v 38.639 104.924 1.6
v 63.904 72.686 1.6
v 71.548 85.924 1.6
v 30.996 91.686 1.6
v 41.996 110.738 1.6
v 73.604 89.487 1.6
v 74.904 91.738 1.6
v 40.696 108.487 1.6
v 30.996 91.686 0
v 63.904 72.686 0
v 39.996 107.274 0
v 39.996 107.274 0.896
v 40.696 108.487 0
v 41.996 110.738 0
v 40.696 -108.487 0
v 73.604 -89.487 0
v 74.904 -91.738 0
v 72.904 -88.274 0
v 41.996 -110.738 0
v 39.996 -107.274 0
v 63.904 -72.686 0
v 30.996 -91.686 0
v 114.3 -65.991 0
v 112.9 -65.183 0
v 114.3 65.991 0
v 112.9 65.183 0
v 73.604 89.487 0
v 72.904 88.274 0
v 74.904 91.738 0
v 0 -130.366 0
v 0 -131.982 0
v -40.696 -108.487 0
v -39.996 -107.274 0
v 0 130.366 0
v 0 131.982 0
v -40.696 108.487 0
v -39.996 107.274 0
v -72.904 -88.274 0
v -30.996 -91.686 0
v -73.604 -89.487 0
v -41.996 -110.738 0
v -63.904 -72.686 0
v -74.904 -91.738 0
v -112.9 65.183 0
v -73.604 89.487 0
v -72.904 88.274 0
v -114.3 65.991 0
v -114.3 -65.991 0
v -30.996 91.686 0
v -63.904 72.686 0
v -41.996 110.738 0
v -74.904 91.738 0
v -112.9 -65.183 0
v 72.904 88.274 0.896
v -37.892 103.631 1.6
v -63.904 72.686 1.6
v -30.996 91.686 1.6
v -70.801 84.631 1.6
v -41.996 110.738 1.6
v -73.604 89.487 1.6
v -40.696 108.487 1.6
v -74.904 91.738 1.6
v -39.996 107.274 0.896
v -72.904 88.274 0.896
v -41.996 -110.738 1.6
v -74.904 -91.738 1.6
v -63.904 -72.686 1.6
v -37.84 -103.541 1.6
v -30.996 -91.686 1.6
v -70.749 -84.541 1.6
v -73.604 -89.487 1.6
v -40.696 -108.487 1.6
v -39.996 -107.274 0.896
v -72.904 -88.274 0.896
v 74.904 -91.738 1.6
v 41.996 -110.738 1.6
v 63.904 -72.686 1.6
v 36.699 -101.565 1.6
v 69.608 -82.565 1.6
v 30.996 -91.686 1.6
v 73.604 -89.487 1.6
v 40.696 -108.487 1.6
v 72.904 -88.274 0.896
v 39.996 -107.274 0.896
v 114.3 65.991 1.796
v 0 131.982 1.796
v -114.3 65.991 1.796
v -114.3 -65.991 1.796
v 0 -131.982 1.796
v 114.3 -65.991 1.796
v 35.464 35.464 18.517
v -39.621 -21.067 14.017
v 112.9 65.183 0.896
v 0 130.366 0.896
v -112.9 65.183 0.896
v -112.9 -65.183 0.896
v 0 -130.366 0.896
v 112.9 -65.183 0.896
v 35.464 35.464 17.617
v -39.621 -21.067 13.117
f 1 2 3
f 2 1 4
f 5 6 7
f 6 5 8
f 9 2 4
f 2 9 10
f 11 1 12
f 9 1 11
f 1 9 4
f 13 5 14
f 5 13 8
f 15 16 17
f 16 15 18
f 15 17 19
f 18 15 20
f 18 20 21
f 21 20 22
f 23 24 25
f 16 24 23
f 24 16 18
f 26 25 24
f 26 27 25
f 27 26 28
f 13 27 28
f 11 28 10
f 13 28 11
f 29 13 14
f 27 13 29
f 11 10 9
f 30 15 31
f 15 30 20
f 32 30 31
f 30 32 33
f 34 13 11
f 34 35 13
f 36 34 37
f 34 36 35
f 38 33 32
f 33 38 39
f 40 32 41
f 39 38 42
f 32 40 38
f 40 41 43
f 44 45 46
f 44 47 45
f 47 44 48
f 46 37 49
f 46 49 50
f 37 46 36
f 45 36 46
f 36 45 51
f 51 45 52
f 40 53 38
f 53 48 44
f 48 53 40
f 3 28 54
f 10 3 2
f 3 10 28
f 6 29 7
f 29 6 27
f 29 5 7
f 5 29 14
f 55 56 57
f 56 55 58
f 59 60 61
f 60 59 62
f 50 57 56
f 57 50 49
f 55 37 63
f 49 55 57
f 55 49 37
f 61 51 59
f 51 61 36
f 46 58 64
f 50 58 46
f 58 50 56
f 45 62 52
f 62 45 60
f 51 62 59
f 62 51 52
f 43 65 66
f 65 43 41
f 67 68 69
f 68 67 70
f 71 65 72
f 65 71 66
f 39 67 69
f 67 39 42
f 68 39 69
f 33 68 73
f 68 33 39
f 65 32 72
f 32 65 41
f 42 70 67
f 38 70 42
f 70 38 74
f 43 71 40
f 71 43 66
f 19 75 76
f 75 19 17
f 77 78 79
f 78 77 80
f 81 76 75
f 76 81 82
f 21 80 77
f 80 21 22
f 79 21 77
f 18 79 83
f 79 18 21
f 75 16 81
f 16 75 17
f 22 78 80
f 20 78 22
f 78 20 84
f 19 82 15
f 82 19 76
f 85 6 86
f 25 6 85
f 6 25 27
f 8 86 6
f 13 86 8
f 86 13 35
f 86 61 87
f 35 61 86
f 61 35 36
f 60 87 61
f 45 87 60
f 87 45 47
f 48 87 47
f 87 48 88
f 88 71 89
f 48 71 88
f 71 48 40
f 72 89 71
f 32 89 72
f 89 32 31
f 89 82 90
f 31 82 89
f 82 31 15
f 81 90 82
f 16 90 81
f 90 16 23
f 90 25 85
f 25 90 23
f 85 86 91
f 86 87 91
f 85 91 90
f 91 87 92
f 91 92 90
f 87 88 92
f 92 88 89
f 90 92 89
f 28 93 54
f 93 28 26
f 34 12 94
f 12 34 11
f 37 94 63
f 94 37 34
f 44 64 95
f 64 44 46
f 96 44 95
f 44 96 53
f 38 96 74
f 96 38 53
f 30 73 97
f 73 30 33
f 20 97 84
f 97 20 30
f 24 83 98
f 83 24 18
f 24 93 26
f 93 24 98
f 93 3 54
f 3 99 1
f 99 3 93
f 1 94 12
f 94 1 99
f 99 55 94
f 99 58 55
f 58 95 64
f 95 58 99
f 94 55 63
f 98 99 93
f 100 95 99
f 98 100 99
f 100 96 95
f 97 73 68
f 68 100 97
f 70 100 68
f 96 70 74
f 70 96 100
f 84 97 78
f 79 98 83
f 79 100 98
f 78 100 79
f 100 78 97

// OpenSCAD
/*
    parametric_faceted_hex_wall_tile_mount_v17.scad
    ------------------------------------------------------------
    Parametric asymmetric low-poly hex wall tile with a truly
    open back and integrated flat double-stick-tape mounting pads.

    Design intent
    -------------
    * The rear of the tile is completely OPEN - no floor plate.
    * Four flat mounting pads sit flush on Z = 0 (the wall plane)
      and rise INTO the hollow interior.
    * Each pad tucks UNDER the inner perimeter shell, so the
      pad-to-shell joint is strong enough to hang the tile.
    * The front is a triangulated low-poly relief with one sharp
      peak (P) and one secondary ridge (Q), both placed at
      user-controlled angles and radial distances.

    Geometry notes
    --------------
    * The outline is a REGULAR POINT-UP hexagon: vertices at
      30, 90, 150, 210, 270, 330 degrees. All six sides are equal,
      all six interior angles are 120 degrees.
    * flat-to-flat  = 2 * circumradius * cos(30)
    * across-corners = 2 * circumradius

    v17 fixes
    ---------
    1. ALL parameters are declared at the top of the file, before
       any computed values. OpenSCAD's Customizer stops scanning
       for parameters at the first non-parameter statement, so
       parameters must come first or the Customizer won't show
       them.
    2. Shell thickness is resolved BEFORE tile dimensions that
       depend on it (OpenSCAD is strictly top-to-bottom).
    3. All assert() messages are single-line strings (OpenSCAD
       does not concatenate adjacent string literals).
    4. Sanity-check echoes confirm the hexagon is regular.

    Export
    ------
        F6 render
        File -> Export -> Export as STL

    Coordinate conventions
    ----------------------
        Z = 0        wall-facing plane (rear face of the tile)
        +Z           away from the wall (front of the tile)
        0 deg        +X axis
        angles CCW   in the XY plane

    Shell polyhedron vertex layout
    ------------------------------
        0..5      outer rear  perimeter   (Z = 0)
        6..11     outer roof  perimeter   (Z = edge_height)
        12        outer peak       P
        13        outer ridge      Q
        14..19    inner rear  perimeter   (Z = 0)
        20..25    inner roof  perimeter   (Z = edge - skin)
        26        inner peak       P
        27        inner ridge      Q
*/

// =============================================================================
// PARAMETERS
// (Everything the OpenSCAD Customizer should see must live in this region,
//  and nothing computed may appear between parameters.)
// =============================================================================

/* [Tile Size] */

// Which measurement tile_size represents.
//   flat_to_flat    distance between opposite flat sides (horizontal)
//   across_corners  distance between opposite vertices
size_reference = "flat_to_flat";  // [flat_to_flat, across_corners]

// Units that tile_size is expressed in.
size_units = "mm";  // [mm, in]

// The measurement of the tile along the chosen reference.
//   mm examples:  152.4 (6"), 203.2 (8"), 228.6 (9"), 254.0 (10")
//   in examples:  6, 8, 9, 10
tile_size = 228.6;

// Rotate the whole finished tile around Z.
tile_rotation_deg = 0;

/* [Front Relief - Mode] */

// How the three relief heights are determined.
//   proportional : heights scale with tile size (using the ratios below)
//   absolute     : heights use the exact mm values below
relief_height_mode = "proportional";  // [proportional, absolute]

// Multiplier applied to whichever relief mode is active.
//   0.5  subtle      1.0  as specified      1.5  dramatic
relief_scale = 1.0;

/* [Front Relief - Proportional] */

// Peak height as a fraction of flat-to-flat.
//   0.040  subtle      0.081  recommended      0.120  dramatic
peak_height_ratio = 0.081;

// Ridge height as a fraction of peak height.
ridge_to_peak_ratio = 0.757;

// Edge height as a fraction of peak height.
edge_to_peak_ratio = 0.097;

/* [Front Relief - Absolute] */

// Used only when relief_height_mode = absolute.
peak_height_mm  = 18.5;
ridge_height_mm = 14.0;
edge_height_mm  = 1.8;

/* [Shell Thickness] */

// Preset shell thicknesses. Choose "custom" to use the two mm values below.
shell_preset = "custom";  // [custom, light, standard, heavy]

// Custom roof skin thickness (mm).
roof_skin_thickness_mm = 0.90;

// Custom perimeter wall thickness (mm).
perimeter_wall_thickness_mm = 1.40;

/* [Facet Layout] */

// Direction of the main peak, CCW from +X.
//
//          90
//           |
//     180 --+-- 0
//           |
//          270
peak_angle_deg = 45;

// Peak distance from center, as a fraction of circumradius.
//   0.20 broad      0.38 recommended      0.50 sharp
peak_radius_ratio = 0.38;

// Direction of the secondary ridge, CCW from +X.
ridge_angle_deg = 208;

// Ridge distance from center, as a fraction of circumradius.
ridge_radius_ratio = 0.34;

/* [Wall Mounting] */

// Enable the four integrated double-stick-tape mounting pads.
add_mount_pads = true;

// Pad width across the flat side (mm).
mount_pad_width = 38.0;

// How far each pad extends inward (mm).
mount_pad_depth = 22.0;

// Pad thickness, rising into the cavity (mm).
// The rear of the pad remains flush at Z = 0.
mount_pad_thickness = 1.60;

// How far each pad tucks under the inner perimeter shell (mm).
// 3-5 mm gives a strong pad-to-shell joint.
mount_pad_overlap = 4.0;

// Directions of the four pads. One per flat side of the hex.
mount_pad_angles = [60, 120, 240, 300];

/* [Optional Screw Holes] */

// Drill a clearance hole through each mounting pad.
add_pad_screw_holes = false;

// Screw clearance diameter (mm).  3.5 = #6,  4.5 = #8.
pad_screw_hole_diameter = 4.5;

/* [Advanced] */

// Convexity hint for the shell polyhedron. Increase if the preview
// shows rendering artifacts.
polyhedron_convexity = 10;

// =============================================================================
// DERIVED: SHELL THICKNESS
// (Must come before tile dimensions, since r_inner uses it.)
// =============================================================================

roof_skin_thickness =
    shell_preset == "light"    ? 0.80 :
    shell_preset == "standard" ? 0.90 :
    shell_preset == "heavy"    ? 1.20 :
                                 roof_skin_thickness_mm;

perimeter_wall_thickness =
    shell_preset == "light"    ? 1.20 :
    shell_preset == "standard" ? 1.40 :
    shell_preset == "heavy"    ? 1.80 :
                                 perimeter_wall_thickness_mm;

// =============================================================================
// DERIVED: TILE DIMENSIONS
// =============================================================================

// Normalise to millimetres.
_tile_size_mm =
    size_units == "in" ? tile_size * 25.4 : tile_size;

// Normalise to flat-to-flat regardless of what the user entered.
tile_flat_to_flat =
    size_reference == "flat_to_flat"
        ? _tile_size_mm
        : _tile_size_mm * cos(30);

tile_across_corners = tile_flat_to_flat / cos(30);

// Regular point-up hexagon:
//     flat-to-flat = 2 * circumradius * cos(30)
r_outer       = (tile_flat_to_flat / 2) / cos(30);
r_inner       = r_outer - perimeter_wall_thickness / cos(30);
outer_apothem = tile_flat_to_flat / 2;
inner_apothem = outer_apothem - perimeter_wall_thickness;

// Length of one inner flat side - upper bound on mount_pad_width.
inner_flat_length = 2 * inner_apothem * tan(30);

// Side length of the outer hexagon (all six are equal for a regular hex).
hex_side_length = 2 * r_outer * sin(30);

// =============================================================================
// DERIVED: RELIEF HEIGHTS
// =============================================================================

_peak_unscaled =
    relief_height_mode == "proportional"
        ? tile_flat_to_flat * peak_height_ratio
        : peak_height_mm;

_ridge_unscaled =
    relief_height_mode == "proportional"
        ? _peak_unscaled * ridge_to_peak_ratio
        : ridge_height_mm;

_edge_unscaled =
    relief_height_mode == "proportional"
        ? _peak_unscaled * edge_to_peak_ratio
        : edge_height_mm;

peak_height  = _peak_unscaled  * relief_scale;
ridge_height = _ridge_unscaled * relief_scale;
edge_height  = _edge_unscaled  * relief_scale;

// =============================================================================
// DIAGNOSTIC ECHO
// =============================================================================

echo("--- Tile summary ---");
echo(str("  flat-to-flat     : ", tile_flat_to_flat,         " mm"));
echo(str("  across-corners   : ", tile_across_corners,       " mm"));
echo(str("  hex side length  : ", hex_side_length,          " mm"));
echo(str("  outer circumrad  : ", r_outer,                   " mm"));
echo(str("  outer apothem    : ", outer_apothem,             " mm"));
echo(str("  inner flat len   : ", inner_flat_length,         " mm"));
echo(str("  edge height      : ", edge_height,              " mm"));
echo(str("  ridge height     : ", ridge_height,             " mm"));
echo(str("  peak height      : ", peak_height,              " mm"));
echo(str("  roof skin        : ", roof_skin_thickness,      " mm"));
echo(str("  perimeter wall   : ", perimeter_wall_thickness, " mm"));

// =============================================================================
// VALIDATION
// =============================================================================

assert(tile_flat_to_flat > 0,
    "Tile size must be > 0.");

assert(edge_height > 0,
    "Computed edge_height must be > 0. Check relief_scale and ratios.");

assert(ridge_height > edge_height,
    "ridge_height must be > edge_height. Check relief_scale and ratios.");

assert(peak_height > ridge_height,
    "peak_height must be > ridge_height. Check relief_scale and ratios.");

assert(roof_skin_thickness > 0,
    "roof_skin_thickness must be > 0.");

assert(roof_skin_thickness < edge_height,
    "roof_skin_thickness must be < edge_height.");

assert(perimeter_wall_thickness > 0,
    "perimeter_wall_thickness must be > 0.");

assert(perimeter_wall_thickness < tile_flat_to_flat / 4,
    "perimeter_wall_thickness is too large for the chosen tile size.");

assert(peak_radius_ratio > 0 && peak_radius_ratio < 0.90,
    "peak_radius_ratio must be in (0, 0.90).");

assert(ridge_radius_ratio > 0 && ridge_radius_ratio < 0.90,
    "ridge_radius_ratio must be in (0, 0.90).");

assert(mount_pad_width > 0,
    "mount_pad_width must be > 0.");

assert(mount_pad_width < inner_flat_length,
    "mount_pad_width exceeds the inner flat length of the tile.");

assert(mount_pad_depth > 0,
    "mount_pad_depth must be > 0.");

assert(mount_pad_thickness > 0,
    "mount_pad_thickness must be > 0.");

assert(mount_pad_overlap >= 0,
    "mount_pad_overlap cannot be negative.");

assert(!add_pad_screw_holes ||
       pad_screw_hole_diameter < mount_pad_width * 0.75,
    "pad_screw_hole_diameter is too large for the pad width.");

// =============================================================================
// HELPERS
// =============================================================================

function polar(angle_deg, radius) =
    [radius * cos(angle_deg), radius * sin(angle_deg)];

// Point-up regular hexagon: vertices at 30 + 60*i degrees.
function hex_vertex(i, radius) =
    [radius * cos(30 + i * 60), radius * sin(30 + i * 60)];

// =============================================================================
// CONTROL POINTS FOR THE FRONT RELIEF
// =============================================================================

P_xy = polar(peak_angle_deg,  r_outer * peak_radius_ratio);
Q_xy = polar(ridge_angle_deg, r_outer * ridge_radius_ratio);

// =============================================================================
// SHELL VERTICES
// =============================================================================

points = concat(
    // --- 0..5 : outer rear perimeter --------------------------------
    [for (i = [0 : 5]) let (p = hex_vertex(i, r_outer))
        [p[0], p[1], 0]],

    // --- 6..11 : outer roof perimeter -------------------------------
    [for (i = [0 : 5]) let (p = hex_vertex(i, r_outer))
        [p[0], p[1], edge_height]],

    // --- 12..13 : outer P, Q ----------------------------------------
    [[P_xy[0], P_xy[1], peak_height],
     [Q_xy[0], Q_xy[1], ridge_height]],

    // --- 14..19 : inner rear perimeter ------------------------------
    [for (i = [0 : 5]) let (p = hex_vertex(i, r_inner))
        [p[0], p[1], 0]],

    // --- 20..25 : inner roof perimeter ------------------------------
    [for (i = [0 : 5]) let (p = hex_vertex(i, r_inner))
        [p[0], p[1], edge_height - roof_skin_thickness]],

    // --- 26..27 : inner P, Q ----------------------------------------
    [[P_xy[0], P_xy[1], peak_height - roof_skin_thickness],
     [Q_xy[0], Q_xy[1], ridge_height - roof_skin_thickness]]
);

// =============================================================================
// FRONT / BACK FACET TRIANGULATIONS
// =============================================================================

// Outer roof: fan around P, diagonal to Q, then fan around Q.
outer_roof_faces = [
    [6, 7, 12],  [7, 8, 12],  [6, 12, 11],
    [8, 13, 12], [11, 12, 13],
    [8, 9, 13],  [9, 10, 13], [10, 11, 13]
];

// Inner roof: same topology, reversed winding, offset by +14.
inner_roof_faces = [
    [26, 21, 20], [26, 22, 21], [25, 26, 20],
    [26, 27, 22], [27, 26, 25],
    [27, 23, 22], [27, 24, 23], [27, 25, 24]
];

// =============================================================================
// COMPLETE SHELL FACE LIST
// =============================================================================

faces = concat(
    // Outer perimeter wall.
    [for (i = [0 : 5]) [i, (i+1)%6, 6 + (i+1)%6, 6 + i]],

    // Outer roof.
    outer_roof_faces,

    // Inner perimeter wall.
    [for (i = [0 : 5]) [14 + i, 20 + i, 20 + (i+1)%6, 14 + (i+1)%6]],

    // Inner roof.
    inner_roof_faces,

    // Rear annular ring - only the narrow shell ring. There is
    // deliberately NO polygon across the center.
    [for (i = [0 : 5]) [i, 14 + i, 14 + (i+1)%6, (i+1)%6]]
);

module tile_shell() {
    polyhedron(
        points    = points,
        faces     = faces,
        convexity = polyhedron_convexity
    );
}

// =============================================================================
// MOUNTING PADS
// =============================================================================
//
// Z = 0 is the wall plane. Each pad is a flat-bottomed prism whose
// underside lies on Z = 0 and whose top rises into the cavity by
// mount_pad_thickness. The outer end of the pad tucks UNDER the
// inner perimeter shell by mount_pad_overlap so the two fuse.

module mount_pad(angle_deg) {
    pad_outer_r = inner_apothem + mount_pad_overlap;
    pad_inner_r = pad_outer_r - mount_pad_depth;

    rotate([0, 0, angle_deg])
        translate([pad_inner_r, -mount_pad_width / 2, 0])
            cube([mount_pad_depth,
                  mount_pad_width,
                  mount_pad_thickness]);
}

module pad_screw_hole(angle_deg) {
    pad_outer_r  = inner_apothem + mount_pad_overlap;
    pad_center_r = pad_outer_r - mount_pad_depth / 2;

    rotate([0, 0, angle_deg])
        translate([pad_center_r, 0, -1])
            cylinder(
                d   = pad_screw_hole_diameter,
                h   = mount_pad_thickness + 2,
                $fn = 32
            );
}

// =============================================================================
// ASSEMBLY
// =============================================================================

module model() {
    rotate([0, 0, tile_rotation_deg]) {
        difference() {
            // ---- positive geometry ---------------------------------
            union() {
                tile_shell();

                if (add_mount_pads) {
                    for (a = mount_pad_angles) mount_pad(a);
                }
            }

            // ---- negative geometry ---------------------------------
            if (add_mount_pads && add_pad_screw_holes) {
                for (a = mount_pad_angles) pad_screw_hole(a);
            }
        }
    }
}

// =============================================================================
// OUTPUT
// =============================================================================

model();
